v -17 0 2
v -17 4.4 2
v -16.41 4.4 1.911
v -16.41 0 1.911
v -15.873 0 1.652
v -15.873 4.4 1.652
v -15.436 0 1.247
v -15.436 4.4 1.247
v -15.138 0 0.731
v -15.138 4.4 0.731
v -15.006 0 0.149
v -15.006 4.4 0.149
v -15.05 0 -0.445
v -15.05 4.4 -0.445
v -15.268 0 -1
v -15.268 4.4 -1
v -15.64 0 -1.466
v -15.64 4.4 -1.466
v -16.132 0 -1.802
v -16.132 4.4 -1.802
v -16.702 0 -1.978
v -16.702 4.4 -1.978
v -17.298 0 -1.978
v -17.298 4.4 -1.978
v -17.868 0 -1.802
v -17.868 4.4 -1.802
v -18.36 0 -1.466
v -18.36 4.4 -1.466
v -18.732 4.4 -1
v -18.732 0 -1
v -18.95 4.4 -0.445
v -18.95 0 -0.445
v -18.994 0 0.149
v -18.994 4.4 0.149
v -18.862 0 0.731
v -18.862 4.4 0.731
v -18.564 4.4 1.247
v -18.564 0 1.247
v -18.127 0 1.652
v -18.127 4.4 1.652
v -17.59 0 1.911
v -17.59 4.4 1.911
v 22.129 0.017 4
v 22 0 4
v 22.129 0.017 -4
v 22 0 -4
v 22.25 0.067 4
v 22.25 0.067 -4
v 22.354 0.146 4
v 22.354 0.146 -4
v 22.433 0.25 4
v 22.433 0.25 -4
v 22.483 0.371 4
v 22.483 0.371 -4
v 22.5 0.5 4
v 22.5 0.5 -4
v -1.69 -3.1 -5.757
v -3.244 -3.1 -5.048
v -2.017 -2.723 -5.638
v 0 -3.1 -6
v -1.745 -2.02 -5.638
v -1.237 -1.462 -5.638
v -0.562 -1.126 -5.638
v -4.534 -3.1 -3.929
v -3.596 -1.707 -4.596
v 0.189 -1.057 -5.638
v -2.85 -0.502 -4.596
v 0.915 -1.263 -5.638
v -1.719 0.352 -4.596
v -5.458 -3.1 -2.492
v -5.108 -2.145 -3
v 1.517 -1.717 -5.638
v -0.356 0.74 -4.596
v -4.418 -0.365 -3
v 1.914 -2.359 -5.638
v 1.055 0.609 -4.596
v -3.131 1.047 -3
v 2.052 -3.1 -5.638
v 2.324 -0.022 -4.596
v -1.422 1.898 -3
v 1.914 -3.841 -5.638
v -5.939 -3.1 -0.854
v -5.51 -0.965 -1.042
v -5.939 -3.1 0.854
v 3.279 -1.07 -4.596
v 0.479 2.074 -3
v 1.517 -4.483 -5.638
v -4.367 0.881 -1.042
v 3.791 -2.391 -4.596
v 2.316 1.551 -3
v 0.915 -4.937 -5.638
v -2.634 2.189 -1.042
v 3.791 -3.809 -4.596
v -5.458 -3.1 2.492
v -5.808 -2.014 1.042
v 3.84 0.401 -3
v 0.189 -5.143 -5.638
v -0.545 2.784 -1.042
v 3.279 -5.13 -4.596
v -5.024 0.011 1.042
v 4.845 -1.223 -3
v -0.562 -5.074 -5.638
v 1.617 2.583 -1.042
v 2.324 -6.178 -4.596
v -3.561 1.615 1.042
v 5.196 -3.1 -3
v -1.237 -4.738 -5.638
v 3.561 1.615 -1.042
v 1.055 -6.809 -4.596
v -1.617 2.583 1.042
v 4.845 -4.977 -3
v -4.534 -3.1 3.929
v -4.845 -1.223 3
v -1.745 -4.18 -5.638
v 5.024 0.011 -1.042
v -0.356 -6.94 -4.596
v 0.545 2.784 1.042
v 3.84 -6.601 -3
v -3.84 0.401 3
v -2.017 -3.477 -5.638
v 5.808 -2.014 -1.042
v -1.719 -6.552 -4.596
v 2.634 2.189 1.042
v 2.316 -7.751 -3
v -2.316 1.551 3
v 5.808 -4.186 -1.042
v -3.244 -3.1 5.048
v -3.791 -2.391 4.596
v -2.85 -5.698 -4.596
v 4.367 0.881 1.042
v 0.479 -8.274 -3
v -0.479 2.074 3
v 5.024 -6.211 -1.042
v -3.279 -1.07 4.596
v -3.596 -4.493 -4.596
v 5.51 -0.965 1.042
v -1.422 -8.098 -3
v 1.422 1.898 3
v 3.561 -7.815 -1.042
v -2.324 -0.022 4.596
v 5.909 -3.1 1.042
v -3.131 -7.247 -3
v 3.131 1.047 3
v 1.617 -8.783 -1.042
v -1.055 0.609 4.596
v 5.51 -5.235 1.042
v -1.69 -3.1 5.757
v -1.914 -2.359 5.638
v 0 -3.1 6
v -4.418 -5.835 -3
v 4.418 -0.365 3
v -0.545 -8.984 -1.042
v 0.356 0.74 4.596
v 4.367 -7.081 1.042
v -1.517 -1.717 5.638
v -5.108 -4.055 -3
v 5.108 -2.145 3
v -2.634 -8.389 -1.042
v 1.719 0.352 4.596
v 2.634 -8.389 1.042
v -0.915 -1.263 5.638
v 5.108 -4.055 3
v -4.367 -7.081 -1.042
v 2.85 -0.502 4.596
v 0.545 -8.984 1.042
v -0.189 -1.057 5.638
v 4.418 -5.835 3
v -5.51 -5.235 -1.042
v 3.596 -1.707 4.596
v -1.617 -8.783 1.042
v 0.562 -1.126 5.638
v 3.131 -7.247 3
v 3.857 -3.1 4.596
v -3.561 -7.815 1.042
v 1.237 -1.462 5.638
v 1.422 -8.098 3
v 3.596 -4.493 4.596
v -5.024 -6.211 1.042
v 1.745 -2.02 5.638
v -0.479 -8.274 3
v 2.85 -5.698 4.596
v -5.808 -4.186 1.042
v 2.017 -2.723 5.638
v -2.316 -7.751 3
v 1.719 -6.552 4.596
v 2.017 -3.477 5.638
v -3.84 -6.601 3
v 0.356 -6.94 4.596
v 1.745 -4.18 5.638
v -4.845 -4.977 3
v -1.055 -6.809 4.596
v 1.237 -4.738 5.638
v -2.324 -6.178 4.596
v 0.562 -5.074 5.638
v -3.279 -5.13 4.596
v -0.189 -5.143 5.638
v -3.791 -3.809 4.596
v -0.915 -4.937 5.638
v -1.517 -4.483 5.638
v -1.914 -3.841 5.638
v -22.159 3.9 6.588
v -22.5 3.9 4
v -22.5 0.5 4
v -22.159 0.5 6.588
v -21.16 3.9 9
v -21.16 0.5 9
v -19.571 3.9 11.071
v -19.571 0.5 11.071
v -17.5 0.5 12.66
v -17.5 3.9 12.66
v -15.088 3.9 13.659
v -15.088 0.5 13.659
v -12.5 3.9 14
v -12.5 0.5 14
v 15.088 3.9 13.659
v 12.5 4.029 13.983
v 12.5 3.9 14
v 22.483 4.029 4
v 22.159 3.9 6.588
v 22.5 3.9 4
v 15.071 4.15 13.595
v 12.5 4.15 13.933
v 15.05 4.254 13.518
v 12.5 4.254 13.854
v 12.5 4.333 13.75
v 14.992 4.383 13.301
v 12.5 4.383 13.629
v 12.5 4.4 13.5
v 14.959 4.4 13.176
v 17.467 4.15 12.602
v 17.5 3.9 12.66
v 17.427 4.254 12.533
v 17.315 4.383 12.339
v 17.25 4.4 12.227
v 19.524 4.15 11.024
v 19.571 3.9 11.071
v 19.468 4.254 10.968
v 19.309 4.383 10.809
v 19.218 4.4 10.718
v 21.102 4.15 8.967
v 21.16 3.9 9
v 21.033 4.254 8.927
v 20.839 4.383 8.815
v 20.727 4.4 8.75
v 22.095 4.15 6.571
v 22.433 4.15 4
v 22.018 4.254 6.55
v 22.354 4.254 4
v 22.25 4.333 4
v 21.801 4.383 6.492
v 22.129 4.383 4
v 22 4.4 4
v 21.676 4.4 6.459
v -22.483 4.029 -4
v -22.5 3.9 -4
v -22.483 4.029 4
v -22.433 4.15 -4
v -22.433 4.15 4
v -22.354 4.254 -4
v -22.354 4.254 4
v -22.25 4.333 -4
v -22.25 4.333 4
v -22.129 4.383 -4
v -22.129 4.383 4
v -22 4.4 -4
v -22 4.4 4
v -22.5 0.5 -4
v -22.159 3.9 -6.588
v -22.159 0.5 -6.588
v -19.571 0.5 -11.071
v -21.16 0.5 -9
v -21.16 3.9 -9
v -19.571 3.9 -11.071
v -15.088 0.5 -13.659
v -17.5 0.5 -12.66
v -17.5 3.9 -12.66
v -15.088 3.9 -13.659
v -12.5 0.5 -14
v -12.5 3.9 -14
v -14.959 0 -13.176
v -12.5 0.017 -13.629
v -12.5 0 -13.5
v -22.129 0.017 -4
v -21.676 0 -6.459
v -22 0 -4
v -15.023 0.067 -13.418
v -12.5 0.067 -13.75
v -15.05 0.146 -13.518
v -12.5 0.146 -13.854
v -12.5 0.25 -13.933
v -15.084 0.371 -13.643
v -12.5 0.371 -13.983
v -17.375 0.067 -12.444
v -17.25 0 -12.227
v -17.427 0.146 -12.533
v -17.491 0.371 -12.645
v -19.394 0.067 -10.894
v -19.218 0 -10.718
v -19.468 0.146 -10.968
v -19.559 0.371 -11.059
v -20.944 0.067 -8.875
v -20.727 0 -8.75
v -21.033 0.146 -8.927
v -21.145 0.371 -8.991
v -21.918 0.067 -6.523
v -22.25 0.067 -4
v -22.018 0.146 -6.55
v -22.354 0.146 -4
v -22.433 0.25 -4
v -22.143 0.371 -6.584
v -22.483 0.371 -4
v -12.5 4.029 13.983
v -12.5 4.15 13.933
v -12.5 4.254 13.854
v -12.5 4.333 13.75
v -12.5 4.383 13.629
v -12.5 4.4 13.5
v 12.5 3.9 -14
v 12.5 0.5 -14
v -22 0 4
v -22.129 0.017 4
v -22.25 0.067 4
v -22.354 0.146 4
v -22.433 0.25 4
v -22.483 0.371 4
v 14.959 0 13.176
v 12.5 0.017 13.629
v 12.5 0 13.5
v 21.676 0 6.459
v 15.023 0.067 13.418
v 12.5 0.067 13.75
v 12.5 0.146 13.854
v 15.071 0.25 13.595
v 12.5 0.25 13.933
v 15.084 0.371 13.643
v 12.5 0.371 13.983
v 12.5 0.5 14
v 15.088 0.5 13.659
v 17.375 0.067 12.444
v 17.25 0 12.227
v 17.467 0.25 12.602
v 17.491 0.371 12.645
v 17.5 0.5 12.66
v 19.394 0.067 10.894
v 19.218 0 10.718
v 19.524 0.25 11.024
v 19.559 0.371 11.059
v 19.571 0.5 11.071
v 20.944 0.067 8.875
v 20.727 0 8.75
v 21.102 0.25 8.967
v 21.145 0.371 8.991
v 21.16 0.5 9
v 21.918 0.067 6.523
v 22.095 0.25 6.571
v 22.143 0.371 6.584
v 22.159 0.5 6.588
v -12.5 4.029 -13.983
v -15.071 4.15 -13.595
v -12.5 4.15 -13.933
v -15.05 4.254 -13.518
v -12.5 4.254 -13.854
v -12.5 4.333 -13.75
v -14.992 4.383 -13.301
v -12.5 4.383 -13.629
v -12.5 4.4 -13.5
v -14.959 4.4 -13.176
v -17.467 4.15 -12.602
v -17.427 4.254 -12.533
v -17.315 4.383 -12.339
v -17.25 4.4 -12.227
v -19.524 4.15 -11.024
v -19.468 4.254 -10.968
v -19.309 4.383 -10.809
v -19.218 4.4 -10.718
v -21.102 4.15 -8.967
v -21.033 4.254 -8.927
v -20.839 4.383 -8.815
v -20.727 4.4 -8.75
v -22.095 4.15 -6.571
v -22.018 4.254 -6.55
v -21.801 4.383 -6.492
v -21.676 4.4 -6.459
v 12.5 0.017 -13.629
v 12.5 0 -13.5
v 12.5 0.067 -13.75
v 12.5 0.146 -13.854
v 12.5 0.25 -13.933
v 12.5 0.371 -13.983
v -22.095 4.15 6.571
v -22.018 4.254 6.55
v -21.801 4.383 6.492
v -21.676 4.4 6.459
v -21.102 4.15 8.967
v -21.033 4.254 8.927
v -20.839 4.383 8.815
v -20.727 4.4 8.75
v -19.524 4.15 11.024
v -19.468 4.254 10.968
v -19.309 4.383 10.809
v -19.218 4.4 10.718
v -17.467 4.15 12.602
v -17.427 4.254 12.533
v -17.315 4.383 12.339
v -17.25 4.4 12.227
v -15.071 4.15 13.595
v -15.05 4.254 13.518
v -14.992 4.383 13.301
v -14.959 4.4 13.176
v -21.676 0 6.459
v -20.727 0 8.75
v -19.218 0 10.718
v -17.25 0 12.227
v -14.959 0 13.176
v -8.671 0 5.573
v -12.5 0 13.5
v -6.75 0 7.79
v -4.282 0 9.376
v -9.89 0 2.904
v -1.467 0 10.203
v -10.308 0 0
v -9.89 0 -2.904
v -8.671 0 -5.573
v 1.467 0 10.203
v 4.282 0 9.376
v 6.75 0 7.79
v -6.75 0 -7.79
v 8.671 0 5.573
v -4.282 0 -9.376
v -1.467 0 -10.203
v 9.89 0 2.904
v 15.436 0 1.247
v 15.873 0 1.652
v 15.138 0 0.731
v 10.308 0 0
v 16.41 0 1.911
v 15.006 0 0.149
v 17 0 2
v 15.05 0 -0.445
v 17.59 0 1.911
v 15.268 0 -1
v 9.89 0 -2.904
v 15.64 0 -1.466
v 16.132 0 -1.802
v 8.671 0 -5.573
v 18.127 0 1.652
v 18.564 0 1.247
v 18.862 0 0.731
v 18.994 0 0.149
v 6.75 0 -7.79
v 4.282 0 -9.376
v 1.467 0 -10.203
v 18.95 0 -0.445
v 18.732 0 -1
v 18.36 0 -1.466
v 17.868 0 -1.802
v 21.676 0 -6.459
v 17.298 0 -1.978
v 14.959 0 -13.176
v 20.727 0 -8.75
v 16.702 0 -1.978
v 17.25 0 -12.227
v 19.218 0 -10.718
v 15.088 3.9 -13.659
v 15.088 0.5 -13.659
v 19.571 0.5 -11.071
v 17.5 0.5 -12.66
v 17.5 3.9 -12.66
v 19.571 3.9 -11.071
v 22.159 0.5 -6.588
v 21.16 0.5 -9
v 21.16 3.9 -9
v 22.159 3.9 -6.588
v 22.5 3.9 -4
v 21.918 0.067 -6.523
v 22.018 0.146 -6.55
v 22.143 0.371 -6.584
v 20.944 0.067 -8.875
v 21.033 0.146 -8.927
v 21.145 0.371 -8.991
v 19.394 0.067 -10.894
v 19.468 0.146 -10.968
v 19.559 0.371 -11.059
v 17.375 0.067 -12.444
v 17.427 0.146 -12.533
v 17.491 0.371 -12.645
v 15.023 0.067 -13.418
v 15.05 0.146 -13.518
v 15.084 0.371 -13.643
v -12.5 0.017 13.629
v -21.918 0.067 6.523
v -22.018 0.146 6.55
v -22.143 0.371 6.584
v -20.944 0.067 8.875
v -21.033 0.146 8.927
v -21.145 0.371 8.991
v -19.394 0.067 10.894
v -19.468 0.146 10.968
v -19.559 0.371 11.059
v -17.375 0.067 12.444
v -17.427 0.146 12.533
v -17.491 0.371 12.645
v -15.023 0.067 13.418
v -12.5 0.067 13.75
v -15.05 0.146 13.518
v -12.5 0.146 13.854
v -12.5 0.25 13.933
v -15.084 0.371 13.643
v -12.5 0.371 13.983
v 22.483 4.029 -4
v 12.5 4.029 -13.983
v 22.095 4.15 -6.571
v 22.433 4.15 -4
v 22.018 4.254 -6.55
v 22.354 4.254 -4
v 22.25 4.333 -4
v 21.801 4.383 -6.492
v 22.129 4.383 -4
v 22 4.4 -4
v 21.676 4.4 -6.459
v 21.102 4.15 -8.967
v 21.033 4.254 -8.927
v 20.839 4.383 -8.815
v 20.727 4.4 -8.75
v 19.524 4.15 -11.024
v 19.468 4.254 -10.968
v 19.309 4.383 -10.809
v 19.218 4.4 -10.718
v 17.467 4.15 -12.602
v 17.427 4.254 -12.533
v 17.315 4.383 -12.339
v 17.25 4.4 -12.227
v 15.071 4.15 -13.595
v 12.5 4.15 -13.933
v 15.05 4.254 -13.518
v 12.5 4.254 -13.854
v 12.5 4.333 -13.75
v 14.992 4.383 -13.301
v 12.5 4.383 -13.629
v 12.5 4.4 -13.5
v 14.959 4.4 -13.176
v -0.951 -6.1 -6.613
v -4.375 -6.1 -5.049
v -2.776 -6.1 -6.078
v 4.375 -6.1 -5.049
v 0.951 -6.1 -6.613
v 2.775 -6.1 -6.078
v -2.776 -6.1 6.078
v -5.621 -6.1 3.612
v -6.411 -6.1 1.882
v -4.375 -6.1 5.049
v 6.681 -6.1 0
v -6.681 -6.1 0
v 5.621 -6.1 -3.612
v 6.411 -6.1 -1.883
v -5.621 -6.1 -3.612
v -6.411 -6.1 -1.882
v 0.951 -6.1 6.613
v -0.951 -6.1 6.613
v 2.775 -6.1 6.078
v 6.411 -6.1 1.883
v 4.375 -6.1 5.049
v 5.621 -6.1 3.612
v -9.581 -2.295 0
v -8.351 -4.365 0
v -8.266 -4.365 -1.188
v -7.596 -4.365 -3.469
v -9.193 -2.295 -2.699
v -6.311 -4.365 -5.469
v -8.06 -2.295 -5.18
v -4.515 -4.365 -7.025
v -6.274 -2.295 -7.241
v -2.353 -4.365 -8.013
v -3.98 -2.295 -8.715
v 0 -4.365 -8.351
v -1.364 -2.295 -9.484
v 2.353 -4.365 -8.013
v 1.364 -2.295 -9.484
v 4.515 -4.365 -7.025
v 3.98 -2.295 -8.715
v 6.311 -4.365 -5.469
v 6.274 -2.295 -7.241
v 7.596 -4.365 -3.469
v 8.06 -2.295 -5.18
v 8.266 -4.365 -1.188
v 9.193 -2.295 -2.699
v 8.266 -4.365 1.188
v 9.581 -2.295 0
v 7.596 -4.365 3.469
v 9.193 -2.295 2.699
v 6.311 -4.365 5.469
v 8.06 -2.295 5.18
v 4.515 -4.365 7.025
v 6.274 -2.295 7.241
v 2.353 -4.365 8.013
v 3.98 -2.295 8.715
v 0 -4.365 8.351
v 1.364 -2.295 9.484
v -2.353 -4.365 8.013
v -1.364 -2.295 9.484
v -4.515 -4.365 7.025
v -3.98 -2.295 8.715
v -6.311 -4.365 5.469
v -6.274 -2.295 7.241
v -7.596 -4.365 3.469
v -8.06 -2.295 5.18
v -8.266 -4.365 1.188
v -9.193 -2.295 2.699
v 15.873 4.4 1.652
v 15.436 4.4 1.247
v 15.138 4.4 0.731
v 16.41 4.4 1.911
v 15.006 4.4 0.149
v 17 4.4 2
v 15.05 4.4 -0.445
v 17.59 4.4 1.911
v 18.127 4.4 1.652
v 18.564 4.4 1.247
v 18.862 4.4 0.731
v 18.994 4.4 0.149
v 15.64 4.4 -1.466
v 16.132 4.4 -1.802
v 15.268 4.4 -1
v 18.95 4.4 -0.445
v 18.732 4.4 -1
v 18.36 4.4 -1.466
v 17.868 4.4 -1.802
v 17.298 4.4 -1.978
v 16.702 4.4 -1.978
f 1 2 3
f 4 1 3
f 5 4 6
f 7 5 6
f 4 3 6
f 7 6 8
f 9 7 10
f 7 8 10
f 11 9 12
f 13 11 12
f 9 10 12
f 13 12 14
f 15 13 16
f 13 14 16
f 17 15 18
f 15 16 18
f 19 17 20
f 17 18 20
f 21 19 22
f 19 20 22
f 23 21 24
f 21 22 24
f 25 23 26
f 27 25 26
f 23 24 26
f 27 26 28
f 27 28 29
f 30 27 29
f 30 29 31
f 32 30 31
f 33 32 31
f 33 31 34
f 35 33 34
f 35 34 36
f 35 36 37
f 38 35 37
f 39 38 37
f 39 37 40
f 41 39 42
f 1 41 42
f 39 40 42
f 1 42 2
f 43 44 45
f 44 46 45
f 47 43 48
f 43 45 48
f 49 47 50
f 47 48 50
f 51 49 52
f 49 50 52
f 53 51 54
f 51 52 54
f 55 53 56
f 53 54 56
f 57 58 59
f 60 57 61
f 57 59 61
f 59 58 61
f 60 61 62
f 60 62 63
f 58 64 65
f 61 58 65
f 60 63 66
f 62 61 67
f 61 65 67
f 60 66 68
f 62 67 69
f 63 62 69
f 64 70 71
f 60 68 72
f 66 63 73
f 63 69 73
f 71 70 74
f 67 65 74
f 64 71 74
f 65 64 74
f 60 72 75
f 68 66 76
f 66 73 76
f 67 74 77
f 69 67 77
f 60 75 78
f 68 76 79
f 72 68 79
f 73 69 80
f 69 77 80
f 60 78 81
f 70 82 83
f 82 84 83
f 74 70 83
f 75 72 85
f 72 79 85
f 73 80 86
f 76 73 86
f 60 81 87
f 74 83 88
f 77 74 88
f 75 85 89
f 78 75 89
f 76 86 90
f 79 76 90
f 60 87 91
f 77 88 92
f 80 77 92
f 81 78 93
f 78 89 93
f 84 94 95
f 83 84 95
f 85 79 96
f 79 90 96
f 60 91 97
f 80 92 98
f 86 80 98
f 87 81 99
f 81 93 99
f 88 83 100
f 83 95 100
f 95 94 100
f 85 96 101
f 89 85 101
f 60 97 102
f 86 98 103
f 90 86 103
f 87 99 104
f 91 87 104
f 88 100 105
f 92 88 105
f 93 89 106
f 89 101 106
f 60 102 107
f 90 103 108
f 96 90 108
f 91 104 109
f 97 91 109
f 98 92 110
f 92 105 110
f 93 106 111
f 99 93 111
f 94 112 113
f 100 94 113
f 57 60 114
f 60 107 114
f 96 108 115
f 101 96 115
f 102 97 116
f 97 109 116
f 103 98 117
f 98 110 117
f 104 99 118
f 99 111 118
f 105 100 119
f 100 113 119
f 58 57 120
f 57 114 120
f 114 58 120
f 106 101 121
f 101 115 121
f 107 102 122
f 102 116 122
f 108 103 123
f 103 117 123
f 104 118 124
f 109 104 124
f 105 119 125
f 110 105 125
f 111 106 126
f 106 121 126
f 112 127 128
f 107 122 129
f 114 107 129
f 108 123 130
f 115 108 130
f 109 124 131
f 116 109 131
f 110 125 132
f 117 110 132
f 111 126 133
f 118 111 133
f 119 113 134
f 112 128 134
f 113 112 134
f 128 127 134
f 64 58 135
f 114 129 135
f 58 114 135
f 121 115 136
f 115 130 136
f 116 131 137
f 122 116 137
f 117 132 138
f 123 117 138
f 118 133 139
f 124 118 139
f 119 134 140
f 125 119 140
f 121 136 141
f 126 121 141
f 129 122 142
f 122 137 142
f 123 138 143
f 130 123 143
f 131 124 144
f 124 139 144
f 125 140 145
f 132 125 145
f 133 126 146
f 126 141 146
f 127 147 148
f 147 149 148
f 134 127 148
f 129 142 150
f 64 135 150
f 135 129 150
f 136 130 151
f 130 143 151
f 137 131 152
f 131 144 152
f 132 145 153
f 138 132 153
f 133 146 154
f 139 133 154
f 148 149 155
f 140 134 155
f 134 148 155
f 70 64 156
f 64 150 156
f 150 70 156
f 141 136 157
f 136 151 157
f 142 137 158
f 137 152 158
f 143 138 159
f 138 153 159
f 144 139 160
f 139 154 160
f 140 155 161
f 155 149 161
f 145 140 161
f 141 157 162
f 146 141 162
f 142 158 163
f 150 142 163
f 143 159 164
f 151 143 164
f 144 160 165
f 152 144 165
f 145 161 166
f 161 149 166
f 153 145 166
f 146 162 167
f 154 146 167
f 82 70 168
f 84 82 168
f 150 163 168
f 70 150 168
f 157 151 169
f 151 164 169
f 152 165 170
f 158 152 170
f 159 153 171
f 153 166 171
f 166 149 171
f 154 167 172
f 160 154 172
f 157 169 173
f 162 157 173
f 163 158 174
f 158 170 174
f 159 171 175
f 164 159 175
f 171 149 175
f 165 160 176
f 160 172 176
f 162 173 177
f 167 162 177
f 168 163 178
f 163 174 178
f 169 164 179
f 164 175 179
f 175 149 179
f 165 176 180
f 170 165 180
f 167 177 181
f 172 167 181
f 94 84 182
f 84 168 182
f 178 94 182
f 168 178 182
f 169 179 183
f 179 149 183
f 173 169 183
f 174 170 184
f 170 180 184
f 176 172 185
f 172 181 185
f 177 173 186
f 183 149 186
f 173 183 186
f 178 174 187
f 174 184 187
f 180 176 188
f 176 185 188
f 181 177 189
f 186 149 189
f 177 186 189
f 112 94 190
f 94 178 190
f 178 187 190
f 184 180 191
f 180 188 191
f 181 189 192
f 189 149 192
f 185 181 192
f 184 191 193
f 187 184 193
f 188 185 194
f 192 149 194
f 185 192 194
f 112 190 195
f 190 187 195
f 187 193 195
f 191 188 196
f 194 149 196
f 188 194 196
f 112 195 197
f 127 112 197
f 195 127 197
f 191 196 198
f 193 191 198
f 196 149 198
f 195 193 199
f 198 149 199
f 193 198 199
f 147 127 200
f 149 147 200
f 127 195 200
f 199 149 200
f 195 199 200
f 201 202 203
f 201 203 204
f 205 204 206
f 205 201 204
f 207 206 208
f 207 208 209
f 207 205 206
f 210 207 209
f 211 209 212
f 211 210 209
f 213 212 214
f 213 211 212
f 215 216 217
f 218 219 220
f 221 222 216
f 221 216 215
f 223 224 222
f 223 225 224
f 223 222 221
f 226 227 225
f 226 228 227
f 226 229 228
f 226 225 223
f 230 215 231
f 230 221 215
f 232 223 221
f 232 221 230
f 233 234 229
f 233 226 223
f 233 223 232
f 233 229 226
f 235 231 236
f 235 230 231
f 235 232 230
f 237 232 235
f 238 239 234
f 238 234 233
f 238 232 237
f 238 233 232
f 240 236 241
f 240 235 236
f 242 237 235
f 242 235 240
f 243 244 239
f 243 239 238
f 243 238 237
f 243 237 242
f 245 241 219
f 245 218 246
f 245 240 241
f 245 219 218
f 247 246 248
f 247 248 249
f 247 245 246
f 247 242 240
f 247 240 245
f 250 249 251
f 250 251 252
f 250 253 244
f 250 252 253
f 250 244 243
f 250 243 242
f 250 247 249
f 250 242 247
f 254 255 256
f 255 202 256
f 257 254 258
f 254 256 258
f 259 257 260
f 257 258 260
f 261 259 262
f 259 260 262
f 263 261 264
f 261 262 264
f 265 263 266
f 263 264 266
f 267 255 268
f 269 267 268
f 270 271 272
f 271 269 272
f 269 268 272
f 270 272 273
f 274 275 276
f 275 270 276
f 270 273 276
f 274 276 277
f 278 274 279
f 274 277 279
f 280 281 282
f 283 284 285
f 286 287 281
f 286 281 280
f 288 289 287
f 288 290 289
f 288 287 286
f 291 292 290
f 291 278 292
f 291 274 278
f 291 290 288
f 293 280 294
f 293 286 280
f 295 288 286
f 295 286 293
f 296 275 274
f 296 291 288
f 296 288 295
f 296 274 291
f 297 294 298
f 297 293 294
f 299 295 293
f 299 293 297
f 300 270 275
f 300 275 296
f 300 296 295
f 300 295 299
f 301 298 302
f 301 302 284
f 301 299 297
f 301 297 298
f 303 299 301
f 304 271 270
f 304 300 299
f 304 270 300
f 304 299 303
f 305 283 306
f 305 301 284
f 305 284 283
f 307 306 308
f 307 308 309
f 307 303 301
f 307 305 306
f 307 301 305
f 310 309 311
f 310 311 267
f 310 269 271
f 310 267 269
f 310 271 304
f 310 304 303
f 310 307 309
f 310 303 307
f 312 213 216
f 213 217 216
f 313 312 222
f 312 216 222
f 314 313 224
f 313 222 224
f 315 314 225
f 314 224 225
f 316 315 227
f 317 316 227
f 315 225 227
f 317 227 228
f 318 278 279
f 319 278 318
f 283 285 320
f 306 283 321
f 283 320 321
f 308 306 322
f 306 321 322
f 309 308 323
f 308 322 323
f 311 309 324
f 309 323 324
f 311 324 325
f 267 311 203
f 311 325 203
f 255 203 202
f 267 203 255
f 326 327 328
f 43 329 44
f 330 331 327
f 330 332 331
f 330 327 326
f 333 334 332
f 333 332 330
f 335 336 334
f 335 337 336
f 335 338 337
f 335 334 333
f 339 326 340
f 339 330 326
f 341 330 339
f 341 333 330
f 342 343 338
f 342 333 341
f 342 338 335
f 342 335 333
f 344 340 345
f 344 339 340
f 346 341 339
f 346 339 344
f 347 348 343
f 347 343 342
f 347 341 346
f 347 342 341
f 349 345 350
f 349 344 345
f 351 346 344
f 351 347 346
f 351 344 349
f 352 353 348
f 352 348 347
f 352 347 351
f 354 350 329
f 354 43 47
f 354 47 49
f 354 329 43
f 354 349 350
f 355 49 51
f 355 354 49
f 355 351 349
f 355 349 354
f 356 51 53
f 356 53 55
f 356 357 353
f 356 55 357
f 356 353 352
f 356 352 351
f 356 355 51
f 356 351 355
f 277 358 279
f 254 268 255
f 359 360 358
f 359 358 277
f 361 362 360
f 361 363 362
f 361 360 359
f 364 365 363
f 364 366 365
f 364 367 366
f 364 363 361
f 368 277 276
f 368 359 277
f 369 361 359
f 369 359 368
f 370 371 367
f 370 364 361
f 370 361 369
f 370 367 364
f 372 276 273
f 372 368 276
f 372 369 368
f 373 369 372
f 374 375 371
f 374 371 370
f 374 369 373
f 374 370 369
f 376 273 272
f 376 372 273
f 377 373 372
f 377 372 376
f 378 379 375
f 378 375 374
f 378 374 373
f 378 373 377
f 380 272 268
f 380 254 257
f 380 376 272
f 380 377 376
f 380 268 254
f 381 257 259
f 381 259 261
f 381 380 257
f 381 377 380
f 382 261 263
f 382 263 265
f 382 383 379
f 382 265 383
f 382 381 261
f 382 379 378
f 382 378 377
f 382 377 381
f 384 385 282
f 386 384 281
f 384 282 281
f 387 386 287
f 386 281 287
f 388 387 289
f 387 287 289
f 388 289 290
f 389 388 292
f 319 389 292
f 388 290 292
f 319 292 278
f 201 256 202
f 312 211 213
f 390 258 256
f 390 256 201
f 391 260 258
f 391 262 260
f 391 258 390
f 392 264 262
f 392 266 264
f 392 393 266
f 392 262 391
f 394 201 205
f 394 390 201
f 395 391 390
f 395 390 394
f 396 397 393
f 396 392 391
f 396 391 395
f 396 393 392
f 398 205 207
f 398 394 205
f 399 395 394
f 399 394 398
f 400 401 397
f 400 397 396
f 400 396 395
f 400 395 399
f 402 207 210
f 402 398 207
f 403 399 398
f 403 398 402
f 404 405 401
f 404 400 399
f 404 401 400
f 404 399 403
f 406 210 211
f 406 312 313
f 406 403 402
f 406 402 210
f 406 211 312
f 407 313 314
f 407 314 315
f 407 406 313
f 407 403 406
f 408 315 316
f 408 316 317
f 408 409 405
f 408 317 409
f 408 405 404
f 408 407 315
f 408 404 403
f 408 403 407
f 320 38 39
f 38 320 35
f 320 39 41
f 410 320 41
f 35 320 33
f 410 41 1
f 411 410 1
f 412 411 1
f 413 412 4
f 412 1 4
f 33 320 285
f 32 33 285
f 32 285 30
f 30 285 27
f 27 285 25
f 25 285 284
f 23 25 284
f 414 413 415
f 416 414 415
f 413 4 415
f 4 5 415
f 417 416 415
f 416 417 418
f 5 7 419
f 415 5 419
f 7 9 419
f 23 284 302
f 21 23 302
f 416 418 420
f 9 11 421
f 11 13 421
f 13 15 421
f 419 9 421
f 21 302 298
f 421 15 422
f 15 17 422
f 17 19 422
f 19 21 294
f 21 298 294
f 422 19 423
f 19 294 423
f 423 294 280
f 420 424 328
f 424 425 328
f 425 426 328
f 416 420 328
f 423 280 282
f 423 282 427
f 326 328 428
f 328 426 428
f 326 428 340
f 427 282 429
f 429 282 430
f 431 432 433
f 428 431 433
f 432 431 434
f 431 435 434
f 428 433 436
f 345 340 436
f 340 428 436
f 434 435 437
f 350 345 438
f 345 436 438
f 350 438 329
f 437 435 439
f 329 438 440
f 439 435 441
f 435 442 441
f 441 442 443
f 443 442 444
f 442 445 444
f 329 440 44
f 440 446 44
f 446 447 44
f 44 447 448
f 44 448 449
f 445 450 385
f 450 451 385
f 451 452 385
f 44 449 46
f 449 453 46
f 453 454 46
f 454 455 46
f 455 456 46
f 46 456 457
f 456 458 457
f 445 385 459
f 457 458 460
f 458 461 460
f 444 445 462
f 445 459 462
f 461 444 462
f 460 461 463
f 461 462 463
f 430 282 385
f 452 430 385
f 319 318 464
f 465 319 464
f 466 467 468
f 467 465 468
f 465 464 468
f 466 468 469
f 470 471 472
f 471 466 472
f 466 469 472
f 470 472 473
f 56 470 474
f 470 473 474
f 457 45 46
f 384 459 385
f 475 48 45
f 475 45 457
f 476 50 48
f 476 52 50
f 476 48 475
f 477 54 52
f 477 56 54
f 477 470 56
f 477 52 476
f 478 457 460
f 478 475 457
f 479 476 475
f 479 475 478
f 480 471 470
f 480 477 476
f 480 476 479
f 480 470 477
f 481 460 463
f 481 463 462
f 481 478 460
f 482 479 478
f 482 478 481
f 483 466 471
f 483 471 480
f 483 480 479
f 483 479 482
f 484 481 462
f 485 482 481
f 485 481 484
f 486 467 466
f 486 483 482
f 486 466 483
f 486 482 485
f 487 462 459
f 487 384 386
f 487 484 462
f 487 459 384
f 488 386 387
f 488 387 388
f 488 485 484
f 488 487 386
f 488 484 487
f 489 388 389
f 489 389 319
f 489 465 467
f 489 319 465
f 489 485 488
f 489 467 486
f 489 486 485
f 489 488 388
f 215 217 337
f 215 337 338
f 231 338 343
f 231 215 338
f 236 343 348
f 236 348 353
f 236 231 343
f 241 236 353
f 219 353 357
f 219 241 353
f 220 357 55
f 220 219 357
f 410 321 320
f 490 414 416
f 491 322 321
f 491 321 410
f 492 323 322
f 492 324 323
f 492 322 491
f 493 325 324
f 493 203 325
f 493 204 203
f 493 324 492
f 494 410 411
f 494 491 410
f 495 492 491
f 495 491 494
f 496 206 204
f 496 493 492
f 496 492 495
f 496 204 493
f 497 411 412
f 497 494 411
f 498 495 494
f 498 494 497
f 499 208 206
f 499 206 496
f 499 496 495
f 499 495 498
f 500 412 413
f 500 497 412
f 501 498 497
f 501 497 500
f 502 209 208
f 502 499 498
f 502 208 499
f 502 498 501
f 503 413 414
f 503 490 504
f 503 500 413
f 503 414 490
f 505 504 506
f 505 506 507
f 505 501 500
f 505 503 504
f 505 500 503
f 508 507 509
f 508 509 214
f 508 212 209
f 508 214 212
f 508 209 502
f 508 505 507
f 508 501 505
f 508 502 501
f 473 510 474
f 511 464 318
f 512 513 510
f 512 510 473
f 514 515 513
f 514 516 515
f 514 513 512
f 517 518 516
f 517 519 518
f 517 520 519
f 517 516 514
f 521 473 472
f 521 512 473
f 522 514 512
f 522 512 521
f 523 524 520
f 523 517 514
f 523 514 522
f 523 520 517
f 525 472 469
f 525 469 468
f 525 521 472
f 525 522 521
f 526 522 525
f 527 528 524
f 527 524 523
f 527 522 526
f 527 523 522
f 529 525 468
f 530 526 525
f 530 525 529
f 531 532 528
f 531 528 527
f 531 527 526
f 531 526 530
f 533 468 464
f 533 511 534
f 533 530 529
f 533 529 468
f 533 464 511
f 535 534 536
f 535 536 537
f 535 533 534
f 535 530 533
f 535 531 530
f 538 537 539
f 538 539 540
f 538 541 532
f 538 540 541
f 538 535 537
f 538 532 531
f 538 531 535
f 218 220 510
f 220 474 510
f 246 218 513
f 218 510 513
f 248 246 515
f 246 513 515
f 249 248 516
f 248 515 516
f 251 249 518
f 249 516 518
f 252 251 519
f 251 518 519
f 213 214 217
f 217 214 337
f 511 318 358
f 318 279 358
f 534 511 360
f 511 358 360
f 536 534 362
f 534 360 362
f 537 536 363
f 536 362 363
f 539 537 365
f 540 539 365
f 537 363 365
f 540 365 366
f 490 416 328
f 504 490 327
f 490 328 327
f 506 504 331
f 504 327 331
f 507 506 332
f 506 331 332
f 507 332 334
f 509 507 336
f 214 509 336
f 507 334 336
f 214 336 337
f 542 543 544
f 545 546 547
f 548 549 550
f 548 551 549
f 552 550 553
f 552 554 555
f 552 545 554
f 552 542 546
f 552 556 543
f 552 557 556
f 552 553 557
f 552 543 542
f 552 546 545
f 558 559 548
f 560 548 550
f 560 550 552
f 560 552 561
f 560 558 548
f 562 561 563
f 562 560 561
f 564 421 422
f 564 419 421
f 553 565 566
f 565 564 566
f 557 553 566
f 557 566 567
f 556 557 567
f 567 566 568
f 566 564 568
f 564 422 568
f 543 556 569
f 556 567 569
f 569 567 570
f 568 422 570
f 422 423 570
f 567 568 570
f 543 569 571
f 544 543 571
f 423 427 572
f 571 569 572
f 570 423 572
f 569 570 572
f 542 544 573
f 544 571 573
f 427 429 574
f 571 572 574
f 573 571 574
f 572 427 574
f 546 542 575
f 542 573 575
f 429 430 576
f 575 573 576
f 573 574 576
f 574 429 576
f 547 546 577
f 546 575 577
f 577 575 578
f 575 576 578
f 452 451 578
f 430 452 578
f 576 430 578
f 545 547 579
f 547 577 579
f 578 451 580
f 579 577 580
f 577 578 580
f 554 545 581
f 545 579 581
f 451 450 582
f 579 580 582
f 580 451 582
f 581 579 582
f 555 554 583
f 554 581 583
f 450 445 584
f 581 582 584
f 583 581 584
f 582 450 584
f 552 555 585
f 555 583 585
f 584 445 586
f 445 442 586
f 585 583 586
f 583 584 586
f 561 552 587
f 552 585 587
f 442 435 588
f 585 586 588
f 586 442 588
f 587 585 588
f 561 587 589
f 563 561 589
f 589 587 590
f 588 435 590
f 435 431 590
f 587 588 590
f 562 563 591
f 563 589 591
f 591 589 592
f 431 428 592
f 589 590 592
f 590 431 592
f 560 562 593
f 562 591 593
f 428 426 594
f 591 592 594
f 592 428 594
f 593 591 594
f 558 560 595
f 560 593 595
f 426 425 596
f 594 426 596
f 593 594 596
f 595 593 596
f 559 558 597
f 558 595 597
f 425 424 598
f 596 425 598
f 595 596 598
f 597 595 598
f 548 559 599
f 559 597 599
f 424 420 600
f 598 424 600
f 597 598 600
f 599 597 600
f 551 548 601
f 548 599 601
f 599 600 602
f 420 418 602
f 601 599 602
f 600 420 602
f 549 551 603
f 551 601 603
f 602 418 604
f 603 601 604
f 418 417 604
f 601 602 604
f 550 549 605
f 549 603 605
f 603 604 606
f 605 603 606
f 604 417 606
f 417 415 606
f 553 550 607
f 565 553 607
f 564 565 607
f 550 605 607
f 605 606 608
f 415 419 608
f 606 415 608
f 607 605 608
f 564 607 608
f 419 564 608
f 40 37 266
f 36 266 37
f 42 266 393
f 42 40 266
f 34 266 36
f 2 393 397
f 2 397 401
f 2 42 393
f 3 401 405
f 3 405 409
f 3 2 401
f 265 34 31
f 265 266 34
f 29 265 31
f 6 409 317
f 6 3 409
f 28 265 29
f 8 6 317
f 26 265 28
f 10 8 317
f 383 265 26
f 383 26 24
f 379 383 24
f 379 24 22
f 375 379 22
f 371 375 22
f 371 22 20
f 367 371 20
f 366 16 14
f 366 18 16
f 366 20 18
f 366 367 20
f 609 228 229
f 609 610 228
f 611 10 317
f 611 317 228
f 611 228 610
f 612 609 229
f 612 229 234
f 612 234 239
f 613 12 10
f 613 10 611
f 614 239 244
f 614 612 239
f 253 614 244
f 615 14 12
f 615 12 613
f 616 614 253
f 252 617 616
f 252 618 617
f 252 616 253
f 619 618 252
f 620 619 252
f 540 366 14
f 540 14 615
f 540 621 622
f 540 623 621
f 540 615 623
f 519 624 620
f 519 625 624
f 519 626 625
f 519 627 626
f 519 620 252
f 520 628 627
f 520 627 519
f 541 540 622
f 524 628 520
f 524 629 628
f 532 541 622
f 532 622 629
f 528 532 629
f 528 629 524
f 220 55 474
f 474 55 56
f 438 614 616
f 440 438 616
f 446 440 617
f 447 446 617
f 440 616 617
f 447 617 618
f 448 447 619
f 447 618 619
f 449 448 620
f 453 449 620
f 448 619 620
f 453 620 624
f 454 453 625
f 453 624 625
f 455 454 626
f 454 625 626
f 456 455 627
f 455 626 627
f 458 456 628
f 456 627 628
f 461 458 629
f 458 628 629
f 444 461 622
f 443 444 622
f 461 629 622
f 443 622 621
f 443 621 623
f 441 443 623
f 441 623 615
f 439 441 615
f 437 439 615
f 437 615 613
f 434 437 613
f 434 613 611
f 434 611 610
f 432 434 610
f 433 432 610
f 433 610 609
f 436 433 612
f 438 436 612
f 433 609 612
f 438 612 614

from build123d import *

# Parameters (mm, degrees)
SKETCH1_W           = 45
SKETCH1_H           = 28
BOSS_EXTRUDE1_DEPTH = 4.4
SKETCH2_R           = 2
CUT_EXTRUDE1_DEPTH  = 4.4
FILLET1_R           = 10
SKETCH5_W           = 13.36263447
SKETCH5_H           = 4.8
CUT_EXTRUDE2_DEPTH  = 12.2
FILLET2_R           = 0.5


with BuildPart() as part:
    # Sketch1 → Boss-Extrude1 (new body)
    with BuildSketch(Plane(origin=(0, 0, 0), x_dir=(1, 0, 0), z_dir=(0, 1, 0))):
        Rectangle(SKETCH1_W, SKETCH1_H)
    extrude(amount=BOSS_EXTRUDE1_DEPTH)

    # Sketch2 → Cut-Extrude1 (cut)
    with BuildSketch(Plane(origin=(0, 4.4, 0), x_dir=(1, 0, 0), z_dir=(0, 1, 0))):
        with Locations(Location((-17, 0, 0), (0, 0, 270))):
            Circle(SKETCH2_R)
        with Locations(Location((17, 0, 0), (0, 0, 270))):
            Circle(SKETCH2_R)
    extrude(amount=-CUT_EXTRUDE1_DEPTH, mode=Mode.SUBTRACT)

    # Fillet1
    fillet1_edges = [part.edges().sort_by_distance(p)[0] for p in [
        (22.5, 2.2, 14),
        (-22.5, 2.2, 14),
        (-22.5, 2.2, -14),
        (22.5, 2.2, -14),
    ]]
    fillet(fillet1_edges, radius=FILLET1_R)

    # Sketch4 → Revolve1 (revolve)
    with BuildSketch(Plane.XY, mode=Mode.PRIVATE) as revolve1_sk:
        with BuildLine():
            Line((0, 2), (0, -8.5))
            ThreePointArc((0, -8.5), (7.424621202, -5.424621202), (10.5, 2))
            Line((10.5, 2), (0, 2))
        make_face()
    revolve(revolve1_sk.sketch.rotate(Axis((0, 2, 0), (0, -1, 0)), 180), axis=Axis((0, 2, 0), (0, -1, 0)))

    # Sketch5 → Cut-Extrude2 (cut, symmetric)
    with BuildSketch(Plane.XY):
        with Locations((0, -8.5)):
            Rectangle(SKETCH5_W, SKETCH5_H)
    extrude(amount=CUT_EXTRUDE2_DEPTH, both=True, mode=Mode.SUBTRACT)

    # Fillet2
    fillet2_edges = [part.edges().sort_by_distance(p)[0] for p in [
        (22.5, 0, 0),
        (22.5, 4.4, 0),
        (0, 0, 14),
        (-22.5, 0, 0),
        (0, 0, -14),
        (-19.571067812, 0, 11.071067812),
        (-19.571067812, 0, -11.071067812),
        (19.571067812, 0, -11.071067812),
        (19.571067812, 0, 11.071067812),
        (0, 4.4, 14),
        (0, 4.4, -14),
        (-22.5, 4.4, 0),
        (-19.571067812, 4.4, 11.071067812),
        (-19.571067812, 4.4, -11.071067812),
        (19.571067812, 4.4, -11.071067812),
        (19.571067812, 4.4, 11.071067812),
    ]]
    fillet(fillet2_edges, radius=FILLET2_R)


with BuildPart() as body_2:
    # Sketch6 → Revolve2 (revolve)
    with BuildSketch(Plane(origin=(0, -3.1, 0), x_dir=(-1, 0, 0), z_dir=(0, -1, 0))):
        with BuildLine():
            Line((0, -6), (0, 6))
            ThreePointArc((0, 6), (6, 0), (0, -6))
        make_face()
    revolve(axis=Axis((0, -3.1, 6), (0, 0, -1)))


solid = Compound([part.part, body_2.part])
